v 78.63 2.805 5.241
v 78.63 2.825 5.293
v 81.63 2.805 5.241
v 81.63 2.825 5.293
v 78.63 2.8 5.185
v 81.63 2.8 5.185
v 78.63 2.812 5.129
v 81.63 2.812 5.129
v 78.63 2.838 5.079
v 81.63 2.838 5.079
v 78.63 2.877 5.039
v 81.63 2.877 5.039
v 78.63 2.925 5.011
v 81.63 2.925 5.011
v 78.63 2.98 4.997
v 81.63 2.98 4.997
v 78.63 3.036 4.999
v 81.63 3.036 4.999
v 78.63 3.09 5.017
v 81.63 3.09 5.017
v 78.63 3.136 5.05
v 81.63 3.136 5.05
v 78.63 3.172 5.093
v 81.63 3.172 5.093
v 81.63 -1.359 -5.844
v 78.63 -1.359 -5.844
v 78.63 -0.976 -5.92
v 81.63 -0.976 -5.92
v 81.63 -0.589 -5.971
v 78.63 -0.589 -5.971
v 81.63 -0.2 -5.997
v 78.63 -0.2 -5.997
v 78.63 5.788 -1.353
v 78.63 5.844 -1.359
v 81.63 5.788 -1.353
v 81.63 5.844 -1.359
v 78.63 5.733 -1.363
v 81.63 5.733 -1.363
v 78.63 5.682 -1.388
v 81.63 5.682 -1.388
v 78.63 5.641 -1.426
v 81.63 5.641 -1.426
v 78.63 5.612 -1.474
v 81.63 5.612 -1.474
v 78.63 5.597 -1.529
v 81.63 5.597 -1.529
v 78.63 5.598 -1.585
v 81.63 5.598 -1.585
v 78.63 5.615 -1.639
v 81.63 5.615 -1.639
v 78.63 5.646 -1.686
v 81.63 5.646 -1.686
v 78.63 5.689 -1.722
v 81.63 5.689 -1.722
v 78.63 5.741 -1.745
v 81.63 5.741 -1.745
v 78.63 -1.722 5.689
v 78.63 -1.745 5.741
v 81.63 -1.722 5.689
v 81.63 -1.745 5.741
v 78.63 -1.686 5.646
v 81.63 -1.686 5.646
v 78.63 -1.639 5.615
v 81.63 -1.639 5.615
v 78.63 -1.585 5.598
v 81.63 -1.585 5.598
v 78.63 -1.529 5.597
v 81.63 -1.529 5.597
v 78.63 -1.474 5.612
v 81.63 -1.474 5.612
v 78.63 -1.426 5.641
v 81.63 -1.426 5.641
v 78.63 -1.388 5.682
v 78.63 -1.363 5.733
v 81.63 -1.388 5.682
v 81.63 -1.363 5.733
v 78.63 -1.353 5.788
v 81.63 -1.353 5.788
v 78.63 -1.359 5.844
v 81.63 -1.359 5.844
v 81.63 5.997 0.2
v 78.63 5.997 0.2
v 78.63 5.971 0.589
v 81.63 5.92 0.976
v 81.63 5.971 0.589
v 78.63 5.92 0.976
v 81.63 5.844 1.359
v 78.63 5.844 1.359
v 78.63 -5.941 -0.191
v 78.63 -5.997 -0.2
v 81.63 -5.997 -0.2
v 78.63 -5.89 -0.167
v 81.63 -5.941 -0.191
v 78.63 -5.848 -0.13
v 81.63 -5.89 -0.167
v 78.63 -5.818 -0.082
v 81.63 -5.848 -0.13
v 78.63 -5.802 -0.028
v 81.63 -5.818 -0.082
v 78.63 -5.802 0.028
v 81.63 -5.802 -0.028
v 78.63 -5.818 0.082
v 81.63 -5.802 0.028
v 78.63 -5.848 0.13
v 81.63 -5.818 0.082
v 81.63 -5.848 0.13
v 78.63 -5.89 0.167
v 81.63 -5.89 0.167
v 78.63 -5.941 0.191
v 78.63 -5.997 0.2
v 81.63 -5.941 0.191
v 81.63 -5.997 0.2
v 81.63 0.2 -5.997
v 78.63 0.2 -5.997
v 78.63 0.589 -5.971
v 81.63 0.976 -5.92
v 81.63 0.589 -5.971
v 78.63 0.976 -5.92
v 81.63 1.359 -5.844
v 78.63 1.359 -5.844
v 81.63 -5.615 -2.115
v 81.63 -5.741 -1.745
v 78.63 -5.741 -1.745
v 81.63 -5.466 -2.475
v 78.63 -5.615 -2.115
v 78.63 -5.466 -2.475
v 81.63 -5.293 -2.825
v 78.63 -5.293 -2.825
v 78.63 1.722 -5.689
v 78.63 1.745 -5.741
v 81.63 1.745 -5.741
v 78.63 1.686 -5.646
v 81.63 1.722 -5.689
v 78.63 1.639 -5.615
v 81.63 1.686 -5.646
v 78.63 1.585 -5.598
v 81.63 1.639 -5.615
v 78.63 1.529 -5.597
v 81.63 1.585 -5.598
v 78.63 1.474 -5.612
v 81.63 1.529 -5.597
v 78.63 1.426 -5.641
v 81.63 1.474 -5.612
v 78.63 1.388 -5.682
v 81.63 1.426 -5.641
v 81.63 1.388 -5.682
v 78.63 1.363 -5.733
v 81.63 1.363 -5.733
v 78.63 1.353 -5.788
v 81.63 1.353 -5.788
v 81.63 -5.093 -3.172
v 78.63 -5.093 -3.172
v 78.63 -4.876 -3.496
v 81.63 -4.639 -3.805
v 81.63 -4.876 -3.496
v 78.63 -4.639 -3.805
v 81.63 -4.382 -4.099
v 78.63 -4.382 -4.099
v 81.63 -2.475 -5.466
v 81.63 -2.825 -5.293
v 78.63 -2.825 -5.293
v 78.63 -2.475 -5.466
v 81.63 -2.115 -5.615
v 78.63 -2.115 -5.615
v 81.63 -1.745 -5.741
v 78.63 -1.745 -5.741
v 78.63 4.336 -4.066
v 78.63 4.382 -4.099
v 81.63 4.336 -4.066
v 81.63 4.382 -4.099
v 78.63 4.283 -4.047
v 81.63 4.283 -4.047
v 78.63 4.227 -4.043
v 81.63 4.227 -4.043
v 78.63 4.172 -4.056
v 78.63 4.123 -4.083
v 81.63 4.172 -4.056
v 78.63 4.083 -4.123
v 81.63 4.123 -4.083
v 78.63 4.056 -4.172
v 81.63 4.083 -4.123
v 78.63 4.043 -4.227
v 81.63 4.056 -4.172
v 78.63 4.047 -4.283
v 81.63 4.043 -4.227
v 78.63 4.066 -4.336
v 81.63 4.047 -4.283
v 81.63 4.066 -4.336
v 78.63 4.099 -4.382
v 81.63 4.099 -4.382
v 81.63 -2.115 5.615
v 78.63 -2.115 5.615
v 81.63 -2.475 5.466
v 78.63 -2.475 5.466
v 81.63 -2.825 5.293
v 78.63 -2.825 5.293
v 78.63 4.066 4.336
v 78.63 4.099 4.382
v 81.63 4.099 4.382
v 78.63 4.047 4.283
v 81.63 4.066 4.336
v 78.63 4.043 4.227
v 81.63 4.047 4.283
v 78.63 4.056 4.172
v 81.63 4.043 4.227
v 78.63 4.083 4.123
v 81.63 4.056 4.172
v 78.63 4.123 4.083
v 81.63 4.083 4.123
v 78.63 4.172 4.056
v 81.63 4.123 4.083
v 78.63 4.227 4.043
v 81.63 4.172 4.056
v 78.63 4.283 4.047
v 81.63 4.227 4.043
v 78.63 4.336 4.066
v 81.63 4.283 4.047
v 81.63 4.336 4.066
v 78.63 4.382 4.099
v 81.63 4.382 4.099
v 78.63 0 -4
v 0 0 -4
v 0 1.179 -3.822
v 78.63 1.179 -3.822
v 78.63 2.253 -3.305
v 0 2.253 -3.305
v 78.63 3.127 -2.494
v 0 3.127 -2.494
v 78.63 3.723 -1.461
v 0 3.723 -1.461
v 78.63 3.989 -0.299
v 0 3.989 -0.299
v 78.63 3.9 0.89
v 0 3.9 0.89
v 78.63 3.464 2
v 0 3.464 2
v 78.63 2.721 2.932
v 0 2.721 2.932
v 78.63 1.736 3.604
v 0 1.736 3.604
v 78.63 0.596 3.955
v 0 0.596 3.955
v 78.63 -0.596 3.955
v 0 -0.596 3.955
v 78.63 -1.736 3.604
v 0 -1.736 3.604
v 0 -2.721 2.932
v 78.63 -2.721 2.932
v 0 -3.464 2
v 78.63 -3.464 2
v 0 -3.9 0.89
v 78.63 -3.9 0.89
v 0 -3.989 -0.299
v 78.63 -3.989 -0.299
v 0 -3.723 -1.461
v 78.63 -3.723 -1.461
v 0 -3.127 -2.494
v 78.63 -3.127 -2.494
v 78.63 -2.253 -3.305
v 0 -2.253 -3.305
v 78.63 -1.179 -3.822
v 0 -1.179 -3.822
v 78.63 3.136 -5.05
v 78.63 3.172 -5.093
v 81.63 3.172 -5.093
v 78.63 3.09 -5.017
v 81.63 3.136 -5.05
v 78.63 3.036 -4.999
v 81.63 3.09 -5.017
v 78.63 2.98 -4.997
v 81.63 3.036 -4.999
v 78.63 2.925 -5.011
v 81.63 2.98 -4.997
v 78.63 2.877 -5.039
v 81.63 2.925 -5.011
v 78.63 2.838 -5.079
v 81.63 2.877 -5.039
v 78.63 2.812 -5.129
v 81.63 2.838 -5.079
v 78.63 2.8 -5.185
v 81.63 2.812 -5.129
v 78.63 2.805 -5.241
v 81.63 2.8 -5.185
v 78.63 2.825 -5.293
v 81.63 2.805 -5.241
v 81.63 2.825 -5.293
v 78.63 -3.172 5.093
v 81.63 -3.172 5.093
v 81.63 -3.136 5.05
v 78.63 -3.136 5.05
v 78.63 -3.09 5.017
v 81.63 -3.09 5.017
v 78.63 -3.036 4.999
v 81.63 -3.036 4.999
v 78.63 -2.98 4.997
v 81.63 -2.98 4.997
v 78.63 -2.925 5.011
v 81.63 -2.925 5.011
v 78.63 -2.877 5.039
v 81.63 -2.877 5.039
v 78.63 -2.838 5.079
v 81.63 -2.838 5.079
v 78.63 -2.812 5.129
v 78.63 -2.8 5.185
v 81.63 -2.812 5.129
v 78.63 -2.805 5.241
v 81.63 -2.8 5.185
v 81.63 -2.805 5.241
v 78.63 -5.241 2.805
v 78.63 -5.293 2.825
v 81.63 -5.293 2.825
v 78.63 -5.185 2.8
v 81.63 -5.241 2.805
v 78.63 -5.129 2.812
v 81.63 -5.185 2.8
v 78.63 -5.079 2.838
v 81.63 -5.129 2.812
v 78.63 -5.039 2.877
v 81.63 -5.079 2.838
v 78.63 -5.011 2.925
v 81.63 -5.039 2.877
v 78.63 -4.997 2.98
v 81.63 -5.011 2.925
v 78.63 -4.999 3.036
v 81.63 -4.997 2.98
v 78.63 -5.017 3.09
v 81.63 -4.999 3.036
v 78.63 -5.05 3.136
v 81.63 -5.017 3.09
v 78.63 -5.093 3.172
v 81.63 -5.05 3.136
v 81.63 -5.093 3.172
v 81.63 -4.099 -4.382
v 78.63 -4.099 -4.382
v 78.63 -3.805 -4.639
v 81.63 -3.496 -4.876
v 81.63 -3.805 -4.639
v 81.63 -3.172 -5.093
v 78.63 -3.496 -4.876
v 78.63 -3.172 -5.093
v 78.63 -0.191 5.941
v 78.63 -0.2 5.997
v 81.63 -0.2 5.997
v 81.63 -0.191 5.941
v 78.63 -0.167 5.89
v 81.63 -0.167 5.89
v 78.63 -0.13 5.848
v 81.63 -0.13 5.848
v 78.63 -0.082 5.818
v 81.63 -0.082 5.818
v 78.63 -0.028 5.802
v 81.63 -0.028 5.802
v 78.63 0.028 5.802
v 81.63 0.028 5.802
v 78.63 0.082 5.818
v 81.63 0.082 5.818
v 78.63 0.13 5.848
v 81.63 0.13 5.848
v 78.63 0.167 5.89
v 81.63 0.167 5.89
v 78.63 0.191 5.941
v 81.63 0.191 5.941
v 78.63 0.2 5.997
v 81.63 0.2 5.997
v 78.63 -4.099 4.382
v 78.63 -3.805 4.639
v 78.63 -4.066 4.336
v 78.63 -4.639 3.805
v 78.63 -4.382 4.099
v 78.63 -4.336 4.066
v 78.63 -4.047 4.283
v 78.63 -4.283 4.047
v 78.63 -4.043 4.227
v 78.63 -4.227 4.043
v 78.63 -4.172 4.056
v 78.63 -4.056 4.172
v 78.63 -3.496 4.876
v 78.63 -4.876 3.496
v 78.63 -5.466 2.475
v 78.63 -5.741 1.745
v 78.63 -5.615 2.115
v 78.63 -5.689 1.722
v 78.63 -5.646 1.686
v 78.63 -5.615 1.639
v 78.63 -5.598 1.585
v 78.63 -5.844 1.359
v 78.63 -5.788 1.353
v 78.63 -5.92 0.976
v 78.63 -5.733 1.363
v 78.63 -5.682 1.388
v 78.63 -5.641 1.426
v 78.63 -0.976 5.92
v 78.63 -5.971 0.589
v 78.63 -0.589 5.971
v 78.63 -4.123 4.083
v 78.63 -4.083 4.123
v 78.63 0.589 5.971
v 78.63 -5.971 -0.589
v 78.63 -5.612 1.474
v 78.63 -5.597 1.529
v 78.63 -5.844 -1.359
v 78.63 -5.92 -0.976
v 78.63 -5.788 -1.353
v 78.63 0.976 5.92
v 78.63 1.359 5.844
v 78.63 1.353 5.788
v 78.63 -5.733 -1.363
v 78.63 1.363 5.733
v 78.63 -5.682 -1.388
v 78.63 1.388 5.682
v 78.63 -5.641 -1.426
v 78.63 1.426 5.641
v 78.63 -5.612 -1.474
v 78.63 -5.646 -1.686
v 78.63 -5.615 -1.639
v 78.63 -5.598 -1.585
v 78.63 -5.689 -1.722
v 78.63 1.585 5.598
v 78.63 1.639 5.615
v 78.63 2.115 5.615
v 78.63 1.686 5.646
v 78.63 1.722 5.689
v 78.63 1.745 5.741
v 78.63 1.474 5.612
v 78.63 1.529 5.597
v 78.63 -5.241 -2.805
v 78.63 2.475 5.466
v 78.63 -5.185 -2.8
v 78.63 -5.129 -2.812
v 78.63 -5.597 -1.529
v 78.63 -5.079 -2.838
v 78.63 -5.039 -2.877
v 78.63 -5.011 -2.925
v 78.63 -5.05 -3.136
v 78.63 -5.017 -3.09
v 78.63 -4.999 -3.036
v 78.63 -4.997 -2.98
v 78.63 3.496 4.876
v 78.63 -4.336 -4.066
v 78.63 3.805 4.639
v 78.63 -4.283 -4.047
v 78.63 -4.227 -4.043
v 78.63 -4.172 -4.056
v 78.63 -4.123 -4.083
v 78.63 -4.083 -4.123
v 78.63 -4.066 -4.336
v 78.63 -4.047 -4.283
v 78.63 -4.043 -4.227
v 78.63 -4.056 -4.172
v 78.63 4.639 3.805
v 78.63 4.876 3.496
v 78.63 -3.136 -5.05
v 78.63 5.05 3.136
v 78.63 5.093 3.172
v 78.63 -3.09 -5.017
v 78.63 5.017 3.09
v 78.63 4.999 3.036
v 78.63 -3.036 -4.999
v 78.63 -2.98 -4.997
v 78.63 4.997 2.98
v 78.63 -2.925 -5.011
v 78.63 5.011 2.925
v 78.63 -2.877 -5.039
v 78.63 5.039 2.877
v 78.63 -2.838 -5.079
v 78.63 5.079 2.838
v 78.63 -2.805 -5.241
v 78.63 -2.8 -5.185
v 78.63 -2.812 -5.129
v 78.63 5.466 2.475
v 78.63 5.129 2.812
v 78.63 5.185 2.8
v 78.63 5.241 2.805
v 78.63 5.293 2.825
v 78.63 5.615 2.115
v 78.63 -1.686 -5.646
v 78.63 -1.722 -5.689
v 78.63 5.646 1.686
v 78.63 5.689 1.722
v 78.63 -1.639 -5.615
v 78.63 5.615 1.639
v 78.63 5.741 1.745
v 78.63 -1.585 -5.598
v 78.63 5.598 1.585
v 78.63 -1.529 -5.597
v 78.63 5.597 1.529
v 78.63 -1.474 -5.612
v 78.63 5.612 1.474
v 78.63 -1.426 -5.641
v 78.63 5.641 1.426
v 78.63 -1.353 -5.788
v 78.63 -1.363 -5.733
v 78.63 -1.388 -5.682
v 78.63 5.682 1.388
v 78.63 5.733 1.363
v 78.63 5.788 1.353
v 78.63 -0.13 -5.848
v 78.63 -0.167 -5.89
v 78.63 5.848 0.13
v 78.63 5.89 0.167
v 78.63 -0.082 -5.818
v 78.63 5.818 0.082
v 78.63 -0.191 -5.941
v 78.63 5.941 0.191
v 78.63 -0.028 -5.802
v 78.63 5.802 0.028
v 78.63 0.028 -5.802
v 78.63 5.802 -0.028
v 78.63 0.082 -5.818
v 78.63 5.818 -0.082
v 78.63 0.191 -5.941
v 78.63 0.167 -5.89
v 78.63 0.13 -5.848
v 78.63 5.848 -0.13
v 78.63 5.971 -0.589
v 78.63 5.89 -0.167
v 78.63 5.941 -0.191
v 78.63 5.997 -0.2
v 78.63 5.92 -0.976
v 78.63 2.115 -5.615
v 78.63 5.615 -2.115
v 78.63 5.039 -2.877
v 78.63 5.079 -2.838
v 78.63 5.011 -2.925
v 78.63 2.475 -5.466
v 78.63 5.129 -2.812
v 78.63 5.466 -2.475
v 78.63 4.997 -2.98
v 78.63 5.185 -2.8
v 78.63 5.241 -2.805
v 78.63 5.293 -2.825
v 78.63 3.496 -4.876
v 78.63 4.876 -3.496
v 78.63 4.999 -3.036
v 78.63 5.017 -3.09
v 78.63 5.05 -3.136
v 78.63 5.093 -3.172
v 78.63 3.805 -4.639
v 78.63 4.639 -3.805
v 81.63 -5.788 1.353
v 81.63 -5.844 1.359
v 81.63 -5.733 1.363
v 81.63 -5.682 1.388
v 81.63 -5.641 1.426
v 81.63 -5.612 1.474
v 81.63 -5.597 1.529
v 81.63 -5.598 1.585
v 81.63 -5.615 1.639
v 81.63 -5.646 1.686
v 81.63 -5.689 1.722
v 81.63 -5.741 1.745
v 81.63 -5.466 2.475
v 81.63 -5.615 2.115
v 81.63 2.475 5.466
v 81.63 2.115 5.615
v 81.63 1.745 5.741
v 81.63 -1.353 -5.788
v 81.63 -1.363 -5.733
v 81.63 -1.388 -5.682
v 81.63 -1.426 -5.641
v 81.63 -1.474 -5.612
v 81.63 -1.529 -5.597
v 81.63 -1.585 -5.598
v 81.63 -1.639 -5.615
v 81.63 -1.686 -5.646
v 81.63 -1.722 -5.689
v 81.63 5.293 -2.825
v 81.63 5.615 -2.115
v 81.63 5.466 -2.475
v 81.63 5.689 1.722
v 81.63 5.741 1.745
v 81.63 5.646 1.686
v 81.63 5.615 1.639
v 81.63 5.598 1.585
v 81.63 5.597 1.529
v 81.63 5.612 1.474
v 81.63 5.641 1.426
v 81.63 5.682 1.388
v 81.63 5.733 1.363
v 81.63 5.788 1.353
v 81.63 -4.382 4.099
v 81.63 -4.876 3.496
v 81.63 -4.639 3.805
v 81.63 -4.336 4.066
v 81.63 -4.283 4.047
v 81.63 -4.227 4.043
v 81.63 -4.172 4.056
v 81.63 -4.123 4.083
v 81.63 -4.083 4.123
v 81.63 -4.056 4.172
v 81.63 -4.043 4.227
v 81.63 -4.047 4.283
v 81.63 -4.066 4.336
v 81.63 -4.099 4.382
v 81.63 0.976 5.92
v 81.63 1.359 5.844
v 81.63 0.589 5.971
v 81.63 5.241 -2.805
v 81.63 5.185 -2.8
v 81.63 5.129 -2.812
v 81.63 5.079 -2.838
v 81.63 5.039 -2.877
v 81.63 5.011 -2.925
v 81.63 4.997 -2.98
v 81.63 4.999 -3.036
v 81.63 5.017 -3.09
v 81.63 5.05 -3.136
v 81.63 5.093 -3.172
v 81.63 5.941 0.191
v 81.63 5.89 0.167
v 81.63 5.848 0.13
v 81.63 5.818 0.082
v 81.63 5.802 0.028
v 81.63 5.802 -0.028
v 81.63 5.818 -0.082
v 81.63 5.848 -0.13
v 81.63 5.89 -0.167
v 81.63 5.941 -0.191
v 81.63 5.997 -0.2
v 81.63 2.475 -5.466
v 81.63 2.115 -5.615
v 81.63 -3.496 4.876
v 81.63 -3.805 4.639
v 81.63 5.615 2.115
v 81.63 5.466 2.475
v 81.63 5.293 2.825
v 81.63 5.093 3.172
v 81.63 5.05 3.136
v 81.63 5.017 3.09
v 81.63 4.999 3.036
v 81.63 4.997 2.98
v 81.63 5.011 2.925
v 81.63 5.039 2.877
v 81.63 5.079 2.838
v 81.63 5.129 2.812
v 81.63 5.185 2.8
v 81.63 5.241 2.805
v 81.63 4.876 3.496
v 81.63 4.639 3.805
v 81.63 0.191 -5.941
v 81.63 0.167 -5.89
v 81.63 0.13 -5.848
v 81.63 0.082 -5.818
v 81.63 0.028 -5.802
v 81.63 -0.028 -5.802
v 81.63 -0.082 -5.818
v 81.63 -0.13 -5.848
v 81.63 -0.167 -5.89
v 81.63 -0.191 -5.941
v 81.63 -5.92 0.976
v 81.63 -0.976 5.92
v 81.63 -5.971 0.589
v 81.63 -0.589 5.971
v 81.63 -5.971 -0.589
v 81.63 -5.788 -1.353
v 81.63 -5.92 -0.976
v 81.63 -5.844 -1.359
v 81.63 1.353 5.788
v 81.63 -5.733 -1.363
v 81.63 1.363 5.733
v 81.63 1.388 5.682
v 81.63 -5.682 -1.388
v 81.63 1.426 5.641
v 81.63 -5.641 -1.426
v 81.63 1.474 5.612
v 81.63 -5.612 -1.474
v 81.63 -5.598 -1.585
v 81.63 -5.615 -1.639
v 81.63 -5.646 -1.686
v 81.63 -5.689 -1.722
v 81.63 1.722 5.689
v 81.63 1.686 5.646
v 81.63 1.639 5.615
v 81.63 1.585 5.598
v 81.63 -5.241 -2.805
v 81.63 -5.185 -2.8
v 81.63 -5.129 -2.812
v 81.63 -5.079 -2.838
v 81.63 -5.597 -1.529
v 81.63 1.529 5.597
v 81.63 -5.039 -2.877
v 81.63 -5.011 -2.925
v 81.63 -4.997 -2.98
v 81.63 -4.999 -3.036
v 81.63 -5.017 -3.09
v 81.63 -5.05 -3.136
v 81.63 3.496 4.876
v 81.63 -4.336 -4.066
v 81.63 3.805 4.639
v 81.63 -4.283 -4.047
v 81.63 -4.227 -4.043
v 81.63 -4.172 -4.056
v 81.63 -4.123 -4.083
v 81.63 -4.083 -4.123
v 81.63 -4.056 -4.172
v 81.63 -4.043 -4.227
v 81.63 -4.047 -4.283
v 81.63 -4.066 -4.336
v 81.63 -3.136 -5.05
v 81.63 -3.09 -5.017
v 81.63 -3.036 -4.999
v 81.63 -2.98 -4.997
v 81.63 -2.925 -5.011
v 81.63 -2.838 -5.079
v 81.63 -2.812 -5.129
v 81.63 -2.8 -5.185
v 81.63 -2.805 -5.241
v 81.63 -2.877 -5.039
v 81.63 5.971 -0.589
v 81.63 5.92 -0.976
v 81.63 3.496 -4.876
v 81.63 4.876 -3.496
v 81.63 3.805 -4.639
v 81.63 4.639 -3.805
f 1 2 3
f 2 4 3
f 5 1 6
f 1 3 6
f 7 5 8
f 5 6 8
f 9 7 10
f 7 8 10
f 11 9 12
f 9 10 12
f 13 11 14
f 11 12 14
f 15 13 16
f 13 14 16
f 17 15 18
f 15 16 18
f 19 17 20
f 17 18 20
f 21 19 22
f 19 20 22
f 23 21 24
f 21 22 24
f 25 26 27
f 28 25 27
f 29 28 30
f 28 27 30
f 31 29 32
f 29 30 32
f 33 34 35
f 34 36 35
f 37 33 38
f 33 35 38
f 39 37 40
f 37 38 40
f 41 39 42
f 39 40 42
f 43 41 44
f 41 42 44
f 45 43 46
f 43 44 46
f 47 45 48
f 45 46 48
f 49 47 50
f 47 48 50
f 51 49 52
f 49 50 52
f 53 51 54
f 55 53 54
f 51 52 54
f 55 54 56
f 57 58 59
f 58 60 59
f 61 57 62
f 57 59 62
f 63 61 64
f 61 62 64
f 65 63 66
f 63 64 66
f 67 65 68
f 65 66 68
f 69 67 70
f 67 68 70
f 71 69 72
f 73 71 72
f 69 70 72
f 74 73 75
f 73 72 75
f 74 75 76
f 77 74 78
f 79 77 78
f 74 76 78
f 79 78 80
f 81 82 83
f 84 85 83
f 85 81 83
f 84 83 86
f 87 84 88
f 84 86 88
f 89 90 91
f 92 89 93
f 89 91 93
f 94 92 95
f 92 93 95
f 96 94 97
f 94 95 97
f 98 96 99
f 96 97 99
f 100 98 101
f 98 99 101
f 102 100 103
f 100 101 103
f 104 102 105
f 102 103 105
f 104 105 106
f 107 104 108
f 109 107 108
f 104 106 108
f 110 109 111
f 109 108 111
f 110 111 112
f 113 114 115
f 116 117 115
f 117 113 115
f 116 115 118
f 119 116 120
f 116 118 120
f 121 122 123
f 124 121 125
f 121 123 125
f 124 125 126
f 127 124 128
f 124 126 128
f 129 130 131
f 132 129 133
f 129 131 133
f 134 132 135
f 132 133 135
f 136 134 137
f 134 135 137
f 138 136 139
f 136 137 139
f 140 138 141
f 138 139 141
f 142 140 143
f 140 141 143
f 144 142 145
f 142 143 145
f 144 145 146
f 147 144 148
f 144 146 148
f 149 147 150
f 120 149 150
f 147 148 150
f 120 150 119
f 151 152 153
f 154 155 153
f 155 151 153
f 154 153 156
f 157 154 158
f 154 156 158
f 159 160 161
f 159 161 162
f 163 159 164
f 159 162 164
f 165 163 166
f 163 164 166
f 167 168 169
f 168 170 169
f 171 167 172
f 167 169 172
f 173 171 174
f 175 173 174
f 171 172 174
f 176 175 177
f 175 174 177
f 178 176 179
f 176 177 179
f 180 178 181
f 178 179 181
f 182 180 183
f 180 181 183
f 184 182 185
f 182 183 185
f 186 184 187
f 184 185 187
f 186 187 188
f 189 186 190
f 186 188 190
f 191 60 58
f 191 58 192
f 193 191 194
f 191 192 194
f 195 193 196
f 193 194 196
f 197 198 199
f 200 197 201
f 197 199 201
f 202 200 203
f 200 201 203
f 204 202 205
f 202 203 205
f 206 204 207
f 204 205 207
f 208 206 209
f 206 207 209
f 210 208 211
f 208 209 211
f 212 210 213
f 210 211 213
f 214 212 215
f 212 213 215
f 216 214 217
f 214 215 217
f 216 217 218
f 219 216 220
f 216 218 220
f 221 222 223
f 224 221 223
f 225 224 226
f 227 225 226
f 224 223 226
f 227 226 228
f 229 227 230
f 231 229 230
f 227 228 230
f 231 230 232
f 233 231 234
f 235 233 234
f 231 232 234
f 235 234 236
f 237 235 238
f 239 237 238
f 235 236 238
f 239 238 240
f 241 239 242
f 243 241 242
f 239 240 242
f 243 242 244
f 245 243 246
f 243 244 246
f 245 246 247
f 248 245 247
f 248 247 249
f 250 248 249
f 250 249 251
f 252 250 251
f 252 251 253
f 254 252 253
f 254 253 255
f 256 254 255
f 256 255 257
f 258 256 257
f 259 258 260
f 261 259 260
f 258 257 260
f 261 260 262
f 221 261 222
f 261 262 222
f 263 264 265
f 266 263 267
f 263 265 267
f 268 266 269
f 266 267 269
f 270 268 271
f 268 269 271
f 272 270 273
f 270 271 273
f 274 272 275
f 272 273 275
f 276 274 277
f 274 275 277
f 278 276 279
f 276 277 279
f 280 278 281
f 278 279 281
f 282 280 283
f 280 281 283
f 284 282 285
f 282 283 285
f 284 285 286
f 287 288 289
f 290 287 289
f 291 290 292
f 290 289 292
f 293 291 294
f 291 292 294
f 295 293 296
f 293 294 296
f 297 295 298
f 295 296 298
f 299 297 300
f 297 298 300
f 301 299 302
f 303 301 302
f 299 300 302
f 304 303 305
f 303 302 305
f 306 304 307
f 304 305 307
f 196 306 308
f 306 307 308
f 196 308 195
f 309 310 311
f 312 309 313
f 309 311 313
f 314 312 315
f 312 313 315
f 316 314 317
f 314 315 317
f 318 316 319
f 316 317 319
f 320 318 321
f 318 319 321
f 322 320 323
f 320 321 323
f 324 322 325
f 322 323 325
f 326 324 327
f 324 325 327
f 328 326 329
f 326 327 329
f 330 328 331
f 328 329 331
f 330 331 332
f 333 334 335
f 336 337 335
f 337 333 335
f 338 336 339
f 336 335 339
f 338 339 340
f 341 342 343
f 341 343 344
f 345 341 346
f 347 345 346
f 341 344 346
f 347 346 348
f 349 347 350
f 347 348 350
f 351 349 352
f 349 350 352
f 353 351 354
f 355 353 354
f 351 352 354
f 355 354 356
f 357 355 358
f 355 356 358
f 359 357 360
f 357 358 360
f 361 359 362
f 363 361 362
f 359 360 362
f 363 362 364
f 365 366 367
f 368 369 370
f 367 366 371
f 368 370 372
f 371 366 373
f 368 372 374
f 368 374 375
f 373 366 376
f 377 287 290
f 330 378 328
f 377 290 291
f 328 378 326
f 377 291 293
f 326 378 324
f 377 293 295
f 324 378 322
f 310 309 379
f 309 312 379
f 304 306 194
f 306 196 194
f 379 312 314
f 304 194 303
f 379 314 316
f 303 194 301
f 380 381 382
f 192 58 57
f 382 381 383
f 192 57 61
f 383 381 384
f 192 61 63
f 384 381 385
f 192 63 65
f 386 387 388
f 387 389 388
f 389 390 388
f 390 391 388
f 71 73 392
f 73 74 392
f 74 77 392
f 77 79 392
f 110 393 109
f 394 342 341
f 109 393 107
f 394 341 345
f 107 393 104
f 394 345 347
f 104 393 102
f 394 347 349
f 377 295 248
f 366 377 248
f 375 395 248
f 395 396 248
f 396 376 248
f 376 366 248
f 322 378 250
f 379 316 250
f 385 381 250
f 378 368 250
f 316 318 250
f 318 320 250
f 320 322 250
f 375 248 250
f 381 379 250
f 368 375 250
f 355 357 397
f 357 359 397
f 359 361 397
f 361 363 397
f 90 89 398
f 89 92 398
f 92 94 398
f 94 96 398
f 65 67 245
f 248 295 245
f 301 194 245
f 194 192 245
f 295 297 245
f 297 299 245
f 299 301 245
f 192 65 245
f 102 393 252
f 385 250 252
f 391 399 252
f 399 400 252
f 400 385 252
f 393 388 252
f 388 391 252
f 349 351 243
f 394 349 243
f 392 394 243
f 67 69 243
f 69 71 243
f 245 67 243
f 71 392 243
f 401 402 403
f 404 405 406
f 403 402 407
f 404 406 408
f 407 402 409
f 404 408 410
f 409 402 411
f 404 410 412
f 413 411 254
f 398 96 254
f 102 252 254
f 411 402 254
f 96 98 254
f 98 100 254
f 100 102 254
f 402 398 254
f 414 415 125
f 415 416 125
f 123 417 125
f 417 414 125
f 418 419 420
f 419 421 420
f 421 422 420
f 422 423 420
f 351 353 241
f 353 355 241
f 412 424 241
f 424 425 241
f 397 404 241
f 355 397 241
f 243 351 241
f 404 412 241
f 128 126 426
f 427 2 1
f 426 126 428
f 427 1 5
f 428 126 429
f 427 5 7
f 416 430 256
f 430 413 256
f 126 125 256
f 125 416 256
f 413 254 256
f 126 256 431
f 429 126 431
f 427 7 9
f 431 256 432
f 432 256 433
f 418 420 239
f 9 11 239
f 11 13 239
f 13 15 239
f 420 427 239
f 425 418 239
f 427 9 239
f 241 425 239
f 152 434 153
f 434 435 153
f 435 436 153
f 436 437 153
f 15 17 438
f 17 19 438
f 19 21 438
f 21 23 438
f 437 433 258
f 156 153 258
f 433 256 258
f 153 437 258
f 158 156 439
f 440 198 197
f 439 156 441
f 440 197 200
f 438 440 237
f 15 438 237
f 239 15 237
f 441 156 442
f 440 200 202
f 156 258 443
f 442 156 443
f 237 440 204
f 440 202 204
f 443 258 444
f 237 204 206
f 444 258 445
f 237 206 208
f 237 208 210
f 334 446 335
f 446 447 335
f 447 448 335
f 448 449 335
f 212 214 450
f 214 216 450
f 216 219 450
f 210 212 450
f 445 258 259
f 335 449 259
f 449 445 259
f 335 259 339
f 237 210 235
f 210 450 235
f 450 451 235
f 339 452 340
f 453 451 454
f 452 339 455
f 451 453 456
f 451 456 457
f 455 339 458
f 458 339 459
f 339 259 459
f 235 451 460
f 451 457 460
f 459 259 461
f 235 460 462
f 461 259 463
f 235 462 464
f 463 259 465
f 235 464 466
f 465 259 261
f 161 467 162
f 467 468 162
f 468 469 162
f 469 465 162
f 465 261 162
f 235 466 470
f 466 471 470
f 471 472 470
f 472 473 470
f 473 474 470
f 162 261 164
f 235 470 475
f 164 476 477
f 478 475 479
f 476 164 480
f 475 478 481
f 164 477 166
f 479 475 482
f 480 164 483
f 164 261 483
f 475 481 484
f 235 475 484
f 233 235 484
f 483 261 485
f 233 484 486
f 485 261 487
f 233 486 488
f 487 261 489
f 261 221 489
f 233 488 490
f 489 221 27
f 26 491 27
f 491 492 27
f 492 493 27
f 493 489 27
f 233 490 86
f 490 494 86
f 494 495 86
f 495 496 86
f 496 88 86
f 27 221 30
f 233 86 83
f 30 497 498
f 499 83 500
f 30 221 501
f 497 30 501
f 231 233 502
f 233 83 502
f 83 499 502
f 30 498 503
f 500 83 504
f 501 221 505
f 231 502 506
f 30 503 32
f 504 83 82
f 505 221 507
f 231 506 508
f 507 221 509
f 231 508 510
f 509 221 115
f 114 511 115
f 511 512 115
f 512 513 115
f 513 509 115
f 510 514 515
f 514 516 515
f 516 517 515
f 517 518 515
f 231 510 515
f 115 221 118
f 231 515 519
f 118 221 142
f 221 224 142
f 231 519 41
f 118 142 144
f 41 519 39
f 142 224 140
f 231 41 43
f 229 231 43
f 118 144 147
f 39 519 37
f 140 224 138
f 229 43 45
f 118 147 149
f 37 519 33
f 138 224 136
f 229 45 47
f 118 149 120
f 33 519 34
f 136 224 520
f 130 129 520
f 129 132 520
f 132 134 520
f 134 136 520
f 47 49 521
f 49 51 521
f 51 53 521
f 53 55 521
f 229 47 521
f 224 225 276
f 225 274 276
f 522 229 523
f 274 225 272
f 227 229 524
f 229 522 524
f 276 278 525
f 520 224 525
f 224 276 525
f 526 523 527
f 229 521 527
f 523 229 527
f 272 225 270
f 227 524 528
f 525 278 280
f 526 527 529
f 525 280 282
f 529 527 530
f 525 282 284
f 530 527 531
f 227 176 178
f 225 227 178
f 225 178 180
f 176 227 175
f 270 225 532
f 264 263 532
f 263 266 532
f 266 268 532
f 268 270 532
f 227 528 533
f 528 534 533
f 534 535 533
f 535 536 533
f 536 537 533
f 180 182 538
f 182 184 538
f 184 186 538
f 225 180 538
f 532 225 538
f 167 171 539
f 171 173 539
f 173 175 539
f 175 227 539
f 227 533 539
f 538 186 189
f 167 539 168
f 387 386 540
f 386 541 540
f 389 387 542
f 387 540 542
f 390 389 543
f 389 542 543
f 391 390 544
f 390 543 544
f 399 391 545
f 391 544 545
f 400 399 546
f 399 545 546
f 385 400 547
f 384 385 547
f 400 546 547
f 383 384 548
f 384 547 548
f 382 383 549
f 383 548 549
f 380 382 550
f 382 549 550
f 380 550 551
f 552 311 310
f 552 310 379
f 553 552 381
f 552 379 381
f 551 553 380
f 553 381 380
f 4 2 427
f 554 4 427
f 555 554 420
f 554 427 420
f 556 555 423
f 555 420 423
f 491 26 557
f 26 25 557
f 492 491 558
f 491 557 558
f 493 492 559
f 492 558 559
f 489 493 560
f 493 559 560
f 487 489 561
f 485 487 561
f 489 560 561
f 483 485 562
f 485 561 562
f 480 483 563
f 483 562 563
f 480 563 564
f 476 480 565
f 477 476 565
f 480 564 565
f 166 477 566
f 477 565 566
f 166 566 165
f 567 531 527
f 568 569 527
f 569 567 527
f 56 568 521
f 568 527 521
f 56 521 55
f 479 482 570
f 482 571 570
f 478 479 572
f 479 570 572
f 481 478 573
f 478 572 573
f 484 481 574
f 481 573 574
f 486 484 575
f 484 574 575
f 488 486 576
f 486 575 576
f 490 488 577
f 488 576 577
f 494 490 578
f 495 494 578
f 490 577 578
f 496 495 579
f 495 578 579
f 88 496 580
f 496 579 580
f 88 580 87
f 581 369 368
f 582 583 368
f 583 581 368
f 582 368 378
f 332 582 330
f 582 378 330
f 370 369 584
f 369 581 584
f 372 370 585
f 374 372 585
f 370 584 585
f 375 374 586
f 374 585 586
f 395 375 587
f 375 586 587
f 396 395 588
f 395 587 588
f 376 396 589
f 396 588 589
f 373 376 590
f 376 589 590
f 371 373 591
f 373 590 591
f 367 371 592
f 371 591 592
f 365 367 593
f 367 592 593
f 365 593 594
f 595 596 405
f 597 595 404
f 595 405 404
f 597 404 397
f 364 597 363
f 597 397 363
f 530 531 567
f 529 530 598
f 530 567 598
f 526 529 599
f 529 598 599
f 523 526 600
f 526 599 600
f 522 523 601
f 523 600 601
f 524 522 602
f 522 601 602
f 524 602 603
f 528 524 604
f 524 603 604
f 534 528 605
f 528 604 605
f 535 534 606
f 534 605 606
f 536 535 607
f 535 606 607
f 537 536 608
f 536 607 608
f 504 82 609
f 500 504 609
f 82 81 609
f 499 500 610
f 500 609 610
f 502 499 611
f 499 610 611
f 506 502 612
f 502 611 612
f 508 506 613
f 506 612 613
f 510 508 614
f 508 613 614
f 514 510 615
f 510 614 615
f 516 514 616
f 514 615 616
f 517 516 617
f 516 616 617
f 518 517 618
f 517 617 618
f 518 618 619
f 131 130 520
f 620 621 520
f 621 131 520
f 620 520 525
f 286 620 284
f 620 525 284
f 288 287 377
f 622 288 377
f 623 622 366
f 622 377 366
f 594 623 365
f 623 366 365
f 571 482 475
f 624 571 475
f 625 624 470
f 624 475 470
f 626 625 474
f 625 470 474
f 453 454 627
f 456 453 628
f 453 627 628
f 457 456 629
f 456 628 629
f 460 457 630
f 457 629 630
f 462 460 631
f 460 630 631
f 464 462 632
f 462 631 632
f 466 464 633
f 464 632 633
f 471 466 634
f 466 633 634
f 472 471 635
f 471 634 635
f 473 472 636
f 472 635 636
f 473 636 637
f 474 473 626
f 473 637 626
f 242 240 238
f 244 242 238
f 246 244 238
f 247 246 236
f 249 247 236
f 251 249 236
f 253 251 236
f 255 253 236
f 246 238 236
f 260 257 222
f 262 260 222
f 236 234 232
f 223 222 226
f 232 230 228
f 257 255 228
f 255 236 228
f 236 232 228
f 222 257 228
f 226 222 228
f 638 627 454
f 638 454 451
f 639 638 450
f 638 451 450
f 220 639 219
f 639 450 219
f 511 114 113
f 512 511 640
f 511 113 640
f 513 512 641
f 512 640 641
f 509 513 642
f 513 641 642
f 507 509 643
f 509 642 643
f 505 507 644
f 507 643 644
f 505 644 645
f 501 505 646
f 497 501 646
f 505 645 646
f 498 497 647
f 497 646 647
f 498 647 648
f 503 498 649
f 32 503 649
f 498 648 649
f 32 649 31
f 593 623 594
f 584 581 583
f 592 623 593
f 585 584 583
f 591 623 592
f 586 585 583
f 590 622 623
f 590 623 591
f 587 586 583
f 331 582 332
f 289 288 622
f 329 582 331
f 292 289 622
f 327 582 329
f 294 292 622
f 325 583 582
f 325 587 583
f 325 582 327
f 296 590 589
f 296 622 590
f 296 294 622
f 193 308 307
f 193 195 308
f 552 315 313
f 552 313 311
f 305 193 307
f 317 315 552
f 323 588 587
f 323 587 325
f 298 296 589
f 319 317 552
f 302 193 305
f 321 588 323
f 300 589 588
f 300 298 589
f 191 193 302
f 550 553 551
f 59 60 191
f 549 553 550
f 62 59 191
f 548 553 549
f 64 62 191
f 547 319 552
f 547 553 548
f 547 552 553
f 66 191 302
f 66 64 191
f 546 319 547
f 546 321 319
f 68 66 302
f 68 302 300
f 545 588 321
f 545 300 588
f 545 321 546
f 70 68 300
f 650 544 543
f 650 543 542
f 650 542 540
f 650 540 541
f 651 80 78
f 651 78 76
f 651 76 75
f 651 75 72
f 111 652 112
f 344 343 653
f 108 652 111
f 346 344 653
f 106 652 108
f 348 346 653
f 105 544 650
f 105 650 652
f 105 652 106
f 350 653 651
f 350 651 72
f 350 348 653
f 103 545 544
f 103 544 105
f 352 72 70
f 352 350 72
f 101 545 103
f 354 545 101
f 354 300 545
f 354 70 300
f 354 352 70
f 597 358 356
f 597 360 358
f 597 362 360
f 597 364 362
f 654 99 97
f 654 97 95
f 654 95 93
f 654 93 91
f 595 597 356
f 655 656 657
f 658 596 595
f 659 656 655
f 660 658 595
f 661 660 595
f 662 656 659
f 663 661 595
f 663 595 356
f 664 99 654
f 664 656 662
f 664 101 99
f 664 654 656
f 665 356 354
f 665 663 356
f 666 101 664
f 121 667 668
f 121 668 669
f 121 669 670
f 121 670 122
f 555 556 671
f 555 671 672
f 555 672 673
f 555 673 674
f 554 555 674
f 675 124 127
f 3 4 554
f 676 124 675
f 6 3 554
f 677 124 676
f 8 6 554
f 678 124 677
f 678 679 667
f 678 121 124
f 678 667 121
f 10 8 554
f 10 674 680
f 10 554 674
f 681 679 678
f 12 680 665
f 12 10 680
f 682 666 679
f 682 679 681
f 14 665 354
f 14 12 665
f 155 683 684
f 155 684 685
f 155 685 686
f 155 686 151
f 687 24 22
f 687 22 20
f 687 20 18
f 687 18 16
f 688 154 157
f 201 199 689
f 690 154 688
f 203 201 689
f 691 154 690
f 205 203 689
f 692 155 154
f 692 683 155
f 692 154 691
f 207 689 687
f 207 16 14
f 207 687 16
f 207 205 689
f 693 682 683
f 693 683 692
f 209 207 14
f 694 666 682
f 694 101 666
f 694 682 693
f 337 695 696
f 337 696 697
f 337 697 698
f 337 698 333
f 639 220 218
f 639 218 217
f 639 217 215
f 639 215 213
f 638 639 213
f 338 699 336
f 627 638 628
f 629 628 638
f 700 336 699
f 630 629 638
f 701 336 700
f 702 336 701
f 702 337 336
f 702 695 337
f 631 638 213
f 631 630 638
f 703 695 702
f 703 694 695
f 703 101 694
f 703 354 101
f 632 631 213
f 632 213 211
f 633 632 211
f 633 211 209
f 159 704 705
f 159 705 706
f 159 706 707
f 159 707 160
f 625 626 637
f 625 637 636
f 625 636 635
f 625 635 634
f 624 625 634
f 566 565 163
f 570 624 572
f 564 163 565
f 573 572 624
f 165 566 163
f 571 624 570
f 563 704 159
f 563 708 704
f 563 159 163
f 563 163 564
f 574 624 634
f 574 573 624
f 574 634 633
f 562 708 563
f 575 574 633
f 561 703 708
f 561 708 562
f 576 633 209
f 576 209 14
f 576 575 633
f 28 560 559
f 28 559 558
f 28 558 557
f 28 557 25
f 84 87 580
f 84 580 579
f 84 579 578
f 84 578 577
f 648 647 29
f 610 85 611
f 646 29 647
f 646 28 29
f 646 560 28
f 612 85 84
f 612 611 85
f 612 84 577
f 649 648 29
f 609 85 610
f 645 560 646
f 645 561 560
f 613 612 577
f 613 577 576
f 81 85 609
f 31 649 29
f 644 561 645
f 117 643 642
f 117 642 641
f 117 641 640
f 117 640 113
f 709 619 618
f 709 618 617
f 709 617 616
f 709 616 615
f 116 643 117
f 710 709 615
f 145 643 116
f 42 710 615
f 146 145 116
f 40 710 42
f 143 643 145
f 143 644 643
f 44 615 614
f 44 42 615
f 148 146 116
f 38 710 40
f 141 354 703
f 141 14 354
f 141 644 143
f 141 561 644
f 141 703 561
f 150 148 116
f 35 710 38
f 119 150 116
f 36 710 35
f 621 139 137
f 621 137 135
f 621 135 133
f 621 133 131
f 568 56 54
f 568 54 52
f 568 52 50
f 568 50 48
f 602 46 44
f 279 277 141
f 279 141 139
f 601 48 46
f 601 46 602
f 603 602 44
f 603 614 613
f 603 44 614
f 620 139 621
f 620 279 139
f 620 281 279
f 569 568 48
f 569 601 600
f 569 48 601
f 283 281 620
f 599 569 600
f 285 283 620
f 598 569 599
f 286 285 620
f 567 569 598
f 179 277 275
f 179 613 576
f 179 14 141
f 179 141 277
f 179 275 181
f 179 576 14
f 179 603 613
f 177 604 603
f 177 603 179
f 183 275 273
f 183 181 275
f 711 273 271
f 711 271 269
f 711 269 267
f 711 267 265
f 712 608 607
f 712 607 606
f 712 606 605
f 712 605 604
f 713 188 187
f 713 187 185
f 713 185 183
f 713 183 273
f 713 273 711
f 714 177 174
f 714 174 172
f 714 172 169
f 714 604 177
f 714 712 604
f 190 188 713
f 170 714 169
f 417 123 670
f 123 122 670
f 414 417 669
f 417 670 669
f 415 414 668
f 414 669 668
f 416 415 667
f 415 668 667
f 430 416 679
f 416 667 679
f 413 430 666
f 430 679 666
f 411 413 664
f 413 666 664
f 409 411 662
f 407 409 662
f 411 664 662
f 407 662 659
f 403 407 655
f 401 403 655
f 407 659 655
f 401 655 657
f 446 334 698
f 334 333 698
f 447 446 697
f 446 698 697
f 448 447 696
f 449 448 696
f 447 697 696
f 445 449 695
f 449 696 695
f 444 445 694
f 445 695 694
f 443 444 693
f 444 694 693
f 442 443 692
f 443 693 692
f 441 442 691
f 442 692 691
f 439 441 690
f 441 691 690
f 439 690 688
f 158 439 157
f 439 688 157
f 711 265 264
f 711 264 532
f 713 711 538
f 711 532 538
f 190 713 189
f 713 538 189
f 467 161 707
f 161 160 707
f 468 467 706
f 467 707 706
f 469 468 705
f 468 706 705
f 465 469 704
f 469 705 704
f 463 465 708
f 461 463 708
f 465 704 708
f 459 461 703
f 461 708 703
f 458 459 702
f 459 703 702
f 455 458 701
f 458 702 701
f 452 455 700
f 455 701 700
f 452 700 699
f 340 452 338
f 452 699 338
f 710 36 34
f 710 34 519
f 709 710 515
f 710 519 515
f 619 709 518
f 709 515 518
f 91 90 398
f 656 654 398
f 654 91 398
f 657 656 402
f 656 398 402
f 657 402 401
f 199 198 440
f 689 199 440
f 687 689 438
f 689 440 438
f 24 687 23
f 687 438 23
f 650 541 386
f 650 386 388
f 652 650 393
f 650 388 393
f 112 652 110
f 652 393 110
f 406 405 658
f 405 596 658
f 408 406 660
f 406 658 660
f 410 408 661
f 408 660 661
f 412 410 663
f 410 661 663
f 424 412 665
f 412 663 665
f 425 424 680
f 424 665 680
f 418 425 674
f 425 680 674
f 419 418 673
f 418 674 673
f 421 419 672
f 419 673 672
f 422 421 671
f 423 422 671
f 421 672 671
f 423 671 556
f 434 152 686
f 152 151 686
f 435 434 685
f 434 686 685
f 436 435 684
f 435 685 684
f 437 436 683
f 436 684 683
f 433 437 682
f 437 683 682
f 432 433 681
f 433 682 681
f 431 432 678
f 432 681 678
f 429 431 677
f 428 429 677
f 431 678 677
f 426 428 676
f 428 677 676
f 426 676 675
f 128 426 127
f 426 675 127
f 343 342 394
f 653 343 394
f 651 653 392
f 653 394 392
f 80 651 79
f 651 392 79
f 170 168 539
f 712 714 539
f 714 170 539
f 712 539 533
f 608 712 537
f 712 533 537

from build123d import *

# Parameters (mm, degrees)
SKETCH1_R           = 4
BOSS_EXTRUDE1_DEPTH = 78.63
SKETCH2_R           = 6
BOSS_EXTRUDE2_DEPTH = 3
SKETCH3_R           = 0.2
CUT_EXTRUDE1_DEPTH  = 3
CIRPATTERN1_COUNT   = 24


with BuildPart() as part:
    # Sketch1 → Boss-Extrude1 (new body)
    with BuildSketch(Plane(origin=(0, 0, 0), x_dir=(0, 0, -1), z_dir=(1, 0, 0))):
        Circle(SKETCH1_R)
    extrude(amount=BOSS_EXTRUDE1_DEPTH)

    # Sketch2 → Boss-Extrude2 (add)
    with BuildSketch(Plane(origin=(78.63, 0, 0), x_dir=(0, 0, -1), z_dir=(1, 0, 0))):
        Circle(SKETCH2_R)
    extrude(amount=BOSS_EXTRUDE2_DEPTH)

    # Sketch3 → Cut-Extrude1 (cut)
    with BuildSketch(Plane(origin=(81.63, 0, 0), x_dir=(0, 0, -1), z_dir=(1, 0, 0))):
        with Locations((-6, 0)):
            Circle(SKETCH3_R)
    cut_extrude1 = extrude(amount=-CUT_EXTRUDE1_DEPTH, mode=Mode.SUBTRACT)

    # CirPattern1: Cut-Extrude1 ×24 about axis
    cirpattern1_axis = Axis((0, 0, 0), (1, 0, 0))
    for i in range(1, CIRPATTERN1_COUNT):
        add(cut_extrude1.rotate(cirpattern1_axis, i * 360 / CIRPATTERN1_COUNT), mode=Mode.SUBTRACT)


solid = part.part
